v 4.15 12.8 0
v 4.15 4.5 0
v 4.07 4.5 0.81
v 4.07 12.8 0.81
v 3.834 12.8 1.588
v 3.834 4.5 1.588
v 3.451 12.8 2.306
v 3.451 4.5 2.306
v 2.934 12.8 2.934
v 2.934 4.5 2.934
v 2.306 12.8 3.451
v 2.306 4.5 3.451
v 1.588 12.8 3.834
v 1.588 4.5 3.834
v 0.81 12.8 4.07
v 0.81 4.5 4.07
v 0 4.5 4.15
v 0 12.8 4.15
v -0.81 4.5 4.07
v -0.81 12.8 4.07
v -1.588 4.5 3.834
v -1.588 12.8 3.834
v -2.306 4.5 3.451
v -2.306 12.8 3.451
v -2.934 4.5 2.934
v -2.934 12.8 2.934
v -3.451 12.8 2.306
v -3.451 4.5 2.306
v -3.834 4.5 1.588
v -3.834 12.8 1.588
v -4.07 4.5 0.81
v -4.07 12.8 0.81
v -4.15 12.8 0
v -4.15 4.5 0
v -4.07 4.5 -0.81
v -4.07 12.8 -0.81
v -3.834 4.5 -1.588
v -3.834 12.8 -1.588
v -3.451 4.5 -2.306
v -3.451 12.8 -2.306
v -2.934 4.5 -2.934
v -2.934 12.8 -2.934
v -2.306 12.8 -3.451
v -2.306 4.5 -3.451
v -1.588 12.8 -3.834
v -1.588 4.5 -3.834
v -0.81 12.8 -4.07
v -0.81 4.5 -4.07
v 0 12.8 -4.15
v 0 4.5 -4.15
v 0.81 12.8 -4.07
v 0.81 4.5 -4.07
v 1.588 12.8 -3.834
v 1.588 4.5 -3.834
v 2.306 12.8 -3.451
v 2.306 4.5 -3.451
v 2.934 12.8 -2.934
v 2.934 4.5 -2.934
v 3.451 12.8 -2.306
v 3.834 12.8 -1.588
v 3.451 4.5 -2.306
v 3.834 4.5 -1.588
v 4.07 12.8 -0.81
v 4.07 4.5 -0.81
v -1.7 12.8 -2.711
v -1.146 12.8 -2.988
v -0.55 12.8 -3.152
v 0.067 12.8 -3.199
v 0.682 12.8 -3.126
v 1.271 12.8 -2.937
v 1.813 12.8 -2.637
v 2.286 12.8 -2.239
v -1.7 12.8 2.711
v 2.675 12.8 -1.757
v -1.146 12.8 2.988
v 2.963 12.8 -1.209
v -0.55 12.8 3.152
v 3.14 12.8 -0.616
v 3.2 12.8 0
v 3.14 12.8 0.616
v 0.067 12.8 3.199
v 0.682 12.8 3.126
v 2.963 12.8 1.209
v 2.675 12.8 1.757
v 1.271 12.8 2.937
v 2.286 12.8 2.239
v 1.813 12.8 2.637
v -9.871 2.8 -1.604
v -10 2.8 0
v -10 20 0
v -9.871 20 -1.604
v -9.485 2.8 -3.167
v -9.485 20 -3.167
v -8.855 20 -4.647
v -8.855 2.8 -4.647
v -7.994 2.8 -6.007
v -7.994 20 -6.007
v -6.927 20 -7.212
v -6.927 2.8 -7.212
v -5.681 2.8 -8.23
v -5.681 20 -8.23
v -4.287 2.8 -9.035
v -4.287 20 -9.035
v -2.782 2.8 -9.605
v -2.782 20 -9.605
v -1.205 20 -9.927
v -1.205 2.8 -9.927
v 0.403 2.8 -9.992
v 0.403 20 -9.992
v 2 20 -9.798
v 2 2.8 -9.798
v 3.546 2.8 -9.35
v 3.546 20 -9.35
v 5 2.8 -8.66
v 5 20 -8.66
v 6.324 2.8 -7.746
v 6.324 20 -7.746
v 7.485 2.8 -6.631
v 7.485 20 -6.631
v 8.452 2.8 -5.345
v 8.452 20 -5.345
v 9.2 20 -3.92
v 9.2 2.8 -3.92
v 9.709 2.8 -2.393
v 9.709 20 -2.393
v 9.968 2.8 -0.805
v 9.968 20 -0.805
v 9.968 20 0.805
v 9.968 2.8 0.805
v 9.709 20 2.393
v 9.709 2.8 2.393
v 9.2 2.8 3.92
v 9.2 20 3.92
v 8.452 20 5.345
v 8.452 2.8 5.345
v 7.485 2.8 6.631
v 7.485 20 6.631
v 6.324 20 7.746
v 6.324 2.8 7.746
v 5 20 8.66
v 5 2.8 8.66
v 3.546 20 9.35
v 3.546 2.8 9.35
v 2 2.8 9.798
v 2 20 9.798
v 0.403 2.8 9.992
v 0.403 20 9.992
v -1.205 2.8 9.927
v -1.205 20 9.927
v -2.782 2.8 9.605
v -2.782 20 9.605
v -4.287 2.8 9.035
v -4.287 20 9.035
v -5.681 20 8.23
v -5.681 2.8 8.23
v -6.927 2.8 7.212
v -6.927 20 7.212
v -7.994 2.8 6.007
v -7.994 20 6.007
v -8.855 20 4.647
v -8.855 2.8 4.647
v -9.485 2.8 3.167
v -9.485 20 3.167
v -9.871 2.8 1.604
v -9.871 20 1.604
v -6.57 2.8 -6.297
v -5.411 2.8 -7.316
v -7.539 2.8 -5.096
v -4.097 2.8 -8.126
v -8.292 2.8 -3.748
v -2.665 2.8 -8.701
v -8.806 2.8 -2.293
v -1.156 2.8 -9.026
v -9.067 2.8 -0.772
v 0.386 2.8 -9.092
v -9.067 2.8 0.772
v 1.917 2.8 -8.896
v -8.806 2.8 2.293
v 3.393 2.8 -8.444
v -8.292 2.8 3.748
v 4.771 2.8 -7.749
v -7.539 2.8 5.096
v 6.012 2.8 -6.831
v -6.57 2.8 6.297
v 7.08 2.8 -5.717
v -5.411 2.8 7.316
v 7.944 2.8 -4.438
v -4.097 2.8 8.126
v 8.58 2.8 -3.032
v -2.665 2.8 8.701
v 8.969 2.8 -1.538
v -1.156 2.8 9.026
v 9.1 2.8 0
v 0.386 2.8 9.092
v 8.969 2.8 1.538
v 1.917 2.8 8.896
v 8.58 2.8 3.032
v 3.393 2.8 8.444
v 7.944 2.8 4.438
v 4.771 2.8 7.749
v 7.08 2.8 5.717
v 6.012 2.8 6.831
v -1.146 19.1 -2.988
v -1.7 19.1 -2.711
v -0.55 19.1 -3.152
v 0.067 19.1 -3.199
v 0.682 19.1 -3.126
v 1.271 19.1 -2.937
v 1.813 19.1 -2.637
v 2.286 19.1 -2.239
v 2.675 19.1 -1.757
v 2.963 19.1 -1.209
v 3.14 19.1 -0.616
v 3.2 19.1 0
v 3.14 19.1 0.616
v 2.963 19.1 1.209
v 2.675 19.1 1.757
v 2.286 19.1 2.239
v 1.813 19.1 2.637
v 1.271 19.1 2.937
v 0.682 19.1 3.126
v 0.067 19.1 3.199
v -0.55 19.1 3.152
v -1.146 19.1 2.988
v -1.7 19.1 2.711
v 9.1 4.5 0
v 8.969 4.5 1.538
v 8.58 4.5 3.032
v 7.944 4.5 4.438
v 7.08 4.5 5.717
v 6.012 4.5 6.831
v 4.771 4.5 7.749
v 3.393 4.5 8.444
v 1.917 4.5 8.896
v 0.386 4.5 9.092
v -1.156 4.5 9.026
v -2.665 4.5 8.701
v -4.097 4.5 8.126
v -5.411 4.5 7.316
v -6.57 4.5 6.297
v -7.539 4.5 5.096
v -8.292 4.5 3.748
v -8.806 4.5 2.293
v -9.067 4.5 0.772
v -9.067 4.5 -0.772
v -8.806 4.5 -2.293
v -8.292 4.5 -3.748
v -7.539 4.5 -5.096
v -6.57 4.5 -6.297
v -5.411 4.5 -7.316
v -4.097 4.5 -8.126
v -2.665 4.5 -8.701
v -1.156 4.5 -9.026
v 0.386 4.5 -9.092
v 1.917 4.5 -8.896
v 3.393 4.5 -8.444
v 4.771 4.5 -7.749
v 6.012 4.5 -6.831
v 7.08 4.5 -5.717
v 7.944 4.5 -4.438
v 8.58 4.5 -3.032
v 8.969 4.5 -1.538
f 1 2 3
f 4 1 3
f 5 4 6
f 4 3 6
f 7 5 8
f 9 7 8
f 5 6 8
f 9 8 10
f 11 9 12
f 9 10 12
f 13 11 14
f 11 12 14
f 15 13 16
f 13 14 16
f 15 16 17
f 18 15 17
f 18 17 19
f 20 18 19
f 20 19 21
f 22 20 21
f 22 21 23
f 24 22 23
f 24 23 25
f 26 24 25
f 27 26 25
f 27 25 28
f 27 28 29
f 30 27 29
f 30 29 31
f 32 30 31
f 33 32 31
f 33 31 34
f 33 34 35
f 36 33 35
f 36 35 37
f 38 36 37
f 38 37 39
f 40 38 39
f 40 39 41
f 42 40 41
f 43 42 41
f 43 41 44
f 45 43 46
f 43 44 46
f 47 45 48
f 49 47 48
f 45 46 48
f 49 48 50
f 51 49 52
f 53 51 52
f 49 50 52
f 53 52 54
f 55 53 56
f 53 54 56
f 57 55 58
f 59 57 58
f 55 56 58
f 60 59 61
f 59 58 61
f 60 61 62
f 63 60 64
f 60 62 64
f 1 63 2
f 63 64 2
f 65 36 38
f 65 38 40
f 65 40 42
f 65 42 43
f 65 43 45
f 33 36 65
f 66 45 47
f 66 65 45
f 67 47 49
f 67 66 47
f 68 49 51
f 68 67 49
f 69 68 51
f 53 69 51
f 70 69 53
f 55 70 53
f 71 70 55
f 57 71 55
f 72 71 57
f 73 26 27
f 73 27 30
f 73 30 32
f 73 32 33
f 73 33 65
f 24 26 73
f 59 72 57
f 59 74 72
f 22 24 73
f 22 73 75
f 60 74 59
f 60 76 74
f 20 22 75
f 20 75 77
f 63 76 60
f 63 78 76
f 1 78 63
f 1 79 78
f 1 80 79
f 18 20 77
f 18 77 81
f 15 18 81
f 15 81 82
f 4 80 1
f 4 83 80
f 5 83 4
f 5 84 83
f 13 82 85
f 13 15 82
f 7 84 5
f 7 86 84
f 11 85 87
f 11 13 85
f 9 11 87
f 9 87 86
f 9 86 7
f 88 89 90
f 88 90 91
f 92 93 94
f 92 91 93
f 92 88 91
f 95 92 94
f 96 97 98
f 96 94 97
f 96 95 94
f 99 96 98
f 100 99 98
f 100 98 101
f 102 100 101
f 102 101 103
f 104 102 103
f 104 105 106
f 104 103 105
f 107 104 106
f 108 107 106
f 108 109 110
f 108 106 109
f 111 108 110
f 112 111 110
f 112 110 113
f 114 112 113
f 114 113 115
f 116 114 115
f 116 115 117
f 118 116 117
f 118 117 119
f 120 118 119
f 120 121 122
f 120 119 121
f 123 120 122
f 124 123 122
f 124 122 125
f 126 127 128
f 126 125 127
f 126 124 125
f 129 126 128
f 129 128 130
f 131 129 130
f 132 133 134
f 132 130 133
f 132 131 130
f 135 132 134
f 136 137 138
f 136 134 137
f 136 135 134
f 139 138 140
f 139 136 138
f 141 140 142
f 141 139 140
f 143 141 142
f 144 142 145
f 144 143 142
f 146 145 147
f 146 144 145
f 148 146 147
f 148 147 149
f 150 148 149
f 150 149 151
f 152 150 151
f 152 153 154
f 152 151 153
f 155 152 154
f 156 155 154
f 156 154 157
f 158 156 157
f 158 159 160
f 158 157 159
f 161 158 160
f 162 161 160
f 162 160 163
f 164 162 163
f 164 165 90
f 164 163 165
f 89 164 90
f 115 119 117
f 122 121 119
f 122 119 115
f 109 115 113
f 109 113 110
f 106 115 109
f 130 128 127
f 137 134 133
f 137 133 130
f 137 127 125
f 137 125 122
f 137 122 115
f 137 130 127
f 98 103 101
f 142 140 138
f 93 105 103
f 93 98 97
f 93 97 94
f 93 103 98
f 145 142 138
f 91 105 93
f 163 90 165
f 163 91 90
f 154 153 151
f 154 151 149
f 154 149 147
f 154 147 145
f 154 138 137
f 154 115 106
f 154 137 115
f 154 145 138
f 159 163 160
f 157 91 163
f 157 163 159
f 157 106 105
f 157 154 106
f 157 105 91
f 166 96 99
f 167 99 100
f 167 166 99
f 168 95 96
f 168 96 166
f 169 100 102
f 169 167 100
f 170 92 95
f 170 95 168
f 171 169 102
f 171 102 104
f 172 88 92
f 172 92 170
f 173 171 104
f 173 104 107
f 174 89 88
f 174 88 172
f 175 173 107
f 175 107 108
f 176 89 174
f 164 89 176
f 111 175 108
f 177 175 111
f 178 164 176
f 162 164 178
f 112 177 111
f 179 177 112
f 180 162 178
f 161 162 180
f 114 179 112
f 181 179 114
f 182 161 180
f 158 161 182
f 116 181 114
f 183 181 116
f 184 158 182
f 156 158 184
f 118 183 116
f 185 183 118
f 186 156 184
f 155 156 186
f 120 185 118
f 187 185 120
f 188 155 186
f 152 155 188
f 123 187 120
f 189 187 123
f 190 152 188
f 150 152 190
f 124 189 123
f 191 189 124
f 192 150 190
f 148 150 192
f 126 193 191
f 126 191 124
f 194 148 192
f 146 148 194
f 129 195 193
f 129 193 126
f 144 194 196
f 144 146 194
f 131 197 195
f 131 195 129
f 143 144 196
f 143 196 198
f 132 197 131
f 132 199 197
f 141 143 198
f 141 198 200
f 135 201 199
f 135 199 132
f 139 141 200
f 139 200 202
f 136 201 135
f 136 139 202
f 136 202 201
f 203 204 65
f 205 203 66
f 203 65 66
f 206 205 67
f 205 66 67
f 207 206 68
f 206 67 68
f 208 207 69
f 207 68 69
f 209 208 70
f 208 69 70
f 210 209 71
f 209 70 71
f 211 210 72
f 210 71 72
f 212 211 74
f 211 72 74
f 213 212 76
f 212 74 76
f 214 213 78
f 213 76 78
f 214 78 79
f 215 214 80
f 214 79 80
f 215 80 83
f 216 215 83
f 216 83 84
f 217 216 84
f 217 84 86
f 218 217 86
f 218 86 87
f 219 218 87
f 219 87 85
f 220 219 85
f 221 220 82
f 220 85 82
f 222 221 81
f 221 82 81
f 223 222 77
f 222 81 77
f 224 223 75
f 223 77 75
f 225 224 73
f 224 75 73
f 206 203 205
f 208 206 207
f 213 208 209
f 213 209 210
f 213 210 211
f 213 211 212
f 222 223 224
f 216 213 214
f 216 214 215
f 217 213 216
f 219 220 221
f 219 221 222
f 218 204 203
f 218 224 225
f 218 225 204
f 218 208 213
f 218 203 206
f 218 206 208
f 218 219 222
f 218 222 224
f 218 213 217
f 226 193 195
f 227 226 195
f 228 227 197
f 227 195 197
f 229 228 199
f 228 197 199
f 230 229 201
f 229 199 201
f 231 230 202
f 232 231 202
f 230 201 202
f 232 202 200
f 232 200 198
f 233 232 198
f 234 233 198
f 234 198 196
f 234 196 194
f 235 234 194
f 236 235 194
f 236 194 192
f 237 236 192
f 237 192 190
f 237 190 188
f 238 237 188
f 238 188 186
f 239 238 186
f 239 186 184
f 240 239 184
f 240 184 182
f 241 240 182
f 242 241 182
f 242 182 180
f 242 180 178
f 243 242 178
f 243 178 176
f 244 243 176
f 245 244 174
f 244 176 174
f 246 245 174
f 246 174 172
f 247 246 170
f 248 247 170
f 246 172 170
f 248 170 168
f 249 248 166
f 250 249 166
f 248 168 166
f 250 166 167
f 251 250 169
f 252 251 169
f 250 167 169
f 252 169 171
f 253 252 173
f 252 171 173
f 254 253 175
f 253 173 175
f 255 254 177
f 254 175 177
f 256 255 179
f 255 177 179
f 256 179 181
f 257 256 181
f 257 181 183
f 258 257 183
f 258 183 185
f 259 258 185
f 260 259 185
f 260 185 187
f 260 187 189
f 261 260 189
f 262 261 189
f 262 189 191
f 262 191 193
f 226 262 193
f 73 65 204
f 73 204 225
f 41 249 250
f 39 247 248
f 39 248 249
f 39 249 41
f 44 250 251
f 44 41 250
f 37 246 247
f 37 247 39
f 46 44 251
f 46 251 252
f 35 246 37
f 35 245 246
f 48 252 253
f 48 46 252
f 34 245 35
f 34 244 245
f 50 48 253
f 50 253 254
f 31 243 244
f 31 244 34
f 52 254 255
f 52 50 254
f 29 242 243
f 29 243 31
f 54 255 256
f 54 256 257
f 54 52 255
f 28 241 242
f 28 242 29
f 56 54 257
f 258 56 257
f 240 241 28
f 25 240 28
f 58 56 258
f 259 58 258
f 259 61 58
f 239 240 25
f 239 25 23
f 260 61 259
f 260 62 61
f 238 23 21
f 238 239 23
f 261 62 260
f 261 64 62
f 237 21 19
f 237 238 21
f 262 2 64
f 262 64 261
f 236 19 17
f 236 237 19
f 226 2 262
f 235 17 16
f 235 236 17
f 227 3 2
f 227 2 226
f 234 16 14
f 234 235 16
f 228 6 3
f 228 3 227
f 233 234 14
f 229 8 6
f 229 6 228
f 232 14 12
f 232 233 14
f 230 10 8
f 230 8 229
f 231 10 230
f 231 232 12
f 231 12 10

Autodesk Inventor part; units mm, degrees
ref_plane "YZ Plane" through (0, 0, 0) normal (1, 0, 0) x (0, 1, 0)
ref_plane "XZ Plane" through (0, 0, 0) normal (0, 1, 0) x (-1, 0, 0)
ref_plane "XY Plane" through (0, 0, 0) normal (0, 0, 1) x (1, 0, 0)
sketch "Sketch2" plane through (0, 0, 0) normal (0, 1, 0) x (-1, 0, 0)
  circle A0 centre (0, 0) radius 10
  dimension "d0" = 20
extrude "Extrusion1" add sketch "Sketch2" along normal blind 20
sketch "Sketch3" plane through (0, 0, 0) normal (0, -1, 0) x (1, 0, 0)
  circle A0 centre (0, 0) radius 4.15
  dimension "d3" = 8.3
extrude "Extrusion2" cut sketch "Sketch3" against normal blind 12.4
sketch "Sketch4" plane through (0, 12.4, 0) normal (0, -1, 0) x (1, 0, 0)
  circle A0 centre (0, 0) radius 4.15 projected
  circle A1 centre (0, 0) radius 3.2
  line L0 (3.2, 0) -> (-1.7, 0)
  line L1 (-1.7, 0) -> (-1.7, -3.7858)
  line L2 (-1.7, 0) -> (-1.7, 3.7858)
  point P0 (-1.7, 2.7111)
  point P1 (-1.7, -2.7111)
  dimension "d16" = 6.4
  dimension "d17" = 4.9
extrude "Extrusion3" cut sketch "Sketch4" against normal blind 6.7 contours A1 L0 L2 | L1 L0 A1
sketch "Sketch8" plane through (0, 0, 0) normal (0, -1, 0) x (1, 0, 0)
  circle A0 centre (0, 0) radius 9.1
  dimension "d18" = 18.2
extrude "Extrusion7" cut sketch "Sketch8" against normal blind 4.5
sketch "Sketch9" plane through (0, 0, 0) normal (0, -1, 0) x (1, 0, 0)
  circle A0 centre (0, 0) radius 10 projected
extrude "Extrusion8" cut sketch "Sketch9" against normal blind 2.8
sketch "Sketch10" plane through (0, 12.4, 0) normal (0, -1, 0) x (1, 0, 0)
  arc A0 (-1.7, -2.7111) -> (-1.7, 2.7111) centre (0, 0) ccw projected
  line L0 (-1.7, -2.7111) -> (-1.7, 2.7111) projected
  circle A1 centre (0, 0) radius 4.15 projected
extrude "Extrusion9" cut sketch "Sketch10" against normal blind 0.4
properties part number "RotaryEncoderKnob"
